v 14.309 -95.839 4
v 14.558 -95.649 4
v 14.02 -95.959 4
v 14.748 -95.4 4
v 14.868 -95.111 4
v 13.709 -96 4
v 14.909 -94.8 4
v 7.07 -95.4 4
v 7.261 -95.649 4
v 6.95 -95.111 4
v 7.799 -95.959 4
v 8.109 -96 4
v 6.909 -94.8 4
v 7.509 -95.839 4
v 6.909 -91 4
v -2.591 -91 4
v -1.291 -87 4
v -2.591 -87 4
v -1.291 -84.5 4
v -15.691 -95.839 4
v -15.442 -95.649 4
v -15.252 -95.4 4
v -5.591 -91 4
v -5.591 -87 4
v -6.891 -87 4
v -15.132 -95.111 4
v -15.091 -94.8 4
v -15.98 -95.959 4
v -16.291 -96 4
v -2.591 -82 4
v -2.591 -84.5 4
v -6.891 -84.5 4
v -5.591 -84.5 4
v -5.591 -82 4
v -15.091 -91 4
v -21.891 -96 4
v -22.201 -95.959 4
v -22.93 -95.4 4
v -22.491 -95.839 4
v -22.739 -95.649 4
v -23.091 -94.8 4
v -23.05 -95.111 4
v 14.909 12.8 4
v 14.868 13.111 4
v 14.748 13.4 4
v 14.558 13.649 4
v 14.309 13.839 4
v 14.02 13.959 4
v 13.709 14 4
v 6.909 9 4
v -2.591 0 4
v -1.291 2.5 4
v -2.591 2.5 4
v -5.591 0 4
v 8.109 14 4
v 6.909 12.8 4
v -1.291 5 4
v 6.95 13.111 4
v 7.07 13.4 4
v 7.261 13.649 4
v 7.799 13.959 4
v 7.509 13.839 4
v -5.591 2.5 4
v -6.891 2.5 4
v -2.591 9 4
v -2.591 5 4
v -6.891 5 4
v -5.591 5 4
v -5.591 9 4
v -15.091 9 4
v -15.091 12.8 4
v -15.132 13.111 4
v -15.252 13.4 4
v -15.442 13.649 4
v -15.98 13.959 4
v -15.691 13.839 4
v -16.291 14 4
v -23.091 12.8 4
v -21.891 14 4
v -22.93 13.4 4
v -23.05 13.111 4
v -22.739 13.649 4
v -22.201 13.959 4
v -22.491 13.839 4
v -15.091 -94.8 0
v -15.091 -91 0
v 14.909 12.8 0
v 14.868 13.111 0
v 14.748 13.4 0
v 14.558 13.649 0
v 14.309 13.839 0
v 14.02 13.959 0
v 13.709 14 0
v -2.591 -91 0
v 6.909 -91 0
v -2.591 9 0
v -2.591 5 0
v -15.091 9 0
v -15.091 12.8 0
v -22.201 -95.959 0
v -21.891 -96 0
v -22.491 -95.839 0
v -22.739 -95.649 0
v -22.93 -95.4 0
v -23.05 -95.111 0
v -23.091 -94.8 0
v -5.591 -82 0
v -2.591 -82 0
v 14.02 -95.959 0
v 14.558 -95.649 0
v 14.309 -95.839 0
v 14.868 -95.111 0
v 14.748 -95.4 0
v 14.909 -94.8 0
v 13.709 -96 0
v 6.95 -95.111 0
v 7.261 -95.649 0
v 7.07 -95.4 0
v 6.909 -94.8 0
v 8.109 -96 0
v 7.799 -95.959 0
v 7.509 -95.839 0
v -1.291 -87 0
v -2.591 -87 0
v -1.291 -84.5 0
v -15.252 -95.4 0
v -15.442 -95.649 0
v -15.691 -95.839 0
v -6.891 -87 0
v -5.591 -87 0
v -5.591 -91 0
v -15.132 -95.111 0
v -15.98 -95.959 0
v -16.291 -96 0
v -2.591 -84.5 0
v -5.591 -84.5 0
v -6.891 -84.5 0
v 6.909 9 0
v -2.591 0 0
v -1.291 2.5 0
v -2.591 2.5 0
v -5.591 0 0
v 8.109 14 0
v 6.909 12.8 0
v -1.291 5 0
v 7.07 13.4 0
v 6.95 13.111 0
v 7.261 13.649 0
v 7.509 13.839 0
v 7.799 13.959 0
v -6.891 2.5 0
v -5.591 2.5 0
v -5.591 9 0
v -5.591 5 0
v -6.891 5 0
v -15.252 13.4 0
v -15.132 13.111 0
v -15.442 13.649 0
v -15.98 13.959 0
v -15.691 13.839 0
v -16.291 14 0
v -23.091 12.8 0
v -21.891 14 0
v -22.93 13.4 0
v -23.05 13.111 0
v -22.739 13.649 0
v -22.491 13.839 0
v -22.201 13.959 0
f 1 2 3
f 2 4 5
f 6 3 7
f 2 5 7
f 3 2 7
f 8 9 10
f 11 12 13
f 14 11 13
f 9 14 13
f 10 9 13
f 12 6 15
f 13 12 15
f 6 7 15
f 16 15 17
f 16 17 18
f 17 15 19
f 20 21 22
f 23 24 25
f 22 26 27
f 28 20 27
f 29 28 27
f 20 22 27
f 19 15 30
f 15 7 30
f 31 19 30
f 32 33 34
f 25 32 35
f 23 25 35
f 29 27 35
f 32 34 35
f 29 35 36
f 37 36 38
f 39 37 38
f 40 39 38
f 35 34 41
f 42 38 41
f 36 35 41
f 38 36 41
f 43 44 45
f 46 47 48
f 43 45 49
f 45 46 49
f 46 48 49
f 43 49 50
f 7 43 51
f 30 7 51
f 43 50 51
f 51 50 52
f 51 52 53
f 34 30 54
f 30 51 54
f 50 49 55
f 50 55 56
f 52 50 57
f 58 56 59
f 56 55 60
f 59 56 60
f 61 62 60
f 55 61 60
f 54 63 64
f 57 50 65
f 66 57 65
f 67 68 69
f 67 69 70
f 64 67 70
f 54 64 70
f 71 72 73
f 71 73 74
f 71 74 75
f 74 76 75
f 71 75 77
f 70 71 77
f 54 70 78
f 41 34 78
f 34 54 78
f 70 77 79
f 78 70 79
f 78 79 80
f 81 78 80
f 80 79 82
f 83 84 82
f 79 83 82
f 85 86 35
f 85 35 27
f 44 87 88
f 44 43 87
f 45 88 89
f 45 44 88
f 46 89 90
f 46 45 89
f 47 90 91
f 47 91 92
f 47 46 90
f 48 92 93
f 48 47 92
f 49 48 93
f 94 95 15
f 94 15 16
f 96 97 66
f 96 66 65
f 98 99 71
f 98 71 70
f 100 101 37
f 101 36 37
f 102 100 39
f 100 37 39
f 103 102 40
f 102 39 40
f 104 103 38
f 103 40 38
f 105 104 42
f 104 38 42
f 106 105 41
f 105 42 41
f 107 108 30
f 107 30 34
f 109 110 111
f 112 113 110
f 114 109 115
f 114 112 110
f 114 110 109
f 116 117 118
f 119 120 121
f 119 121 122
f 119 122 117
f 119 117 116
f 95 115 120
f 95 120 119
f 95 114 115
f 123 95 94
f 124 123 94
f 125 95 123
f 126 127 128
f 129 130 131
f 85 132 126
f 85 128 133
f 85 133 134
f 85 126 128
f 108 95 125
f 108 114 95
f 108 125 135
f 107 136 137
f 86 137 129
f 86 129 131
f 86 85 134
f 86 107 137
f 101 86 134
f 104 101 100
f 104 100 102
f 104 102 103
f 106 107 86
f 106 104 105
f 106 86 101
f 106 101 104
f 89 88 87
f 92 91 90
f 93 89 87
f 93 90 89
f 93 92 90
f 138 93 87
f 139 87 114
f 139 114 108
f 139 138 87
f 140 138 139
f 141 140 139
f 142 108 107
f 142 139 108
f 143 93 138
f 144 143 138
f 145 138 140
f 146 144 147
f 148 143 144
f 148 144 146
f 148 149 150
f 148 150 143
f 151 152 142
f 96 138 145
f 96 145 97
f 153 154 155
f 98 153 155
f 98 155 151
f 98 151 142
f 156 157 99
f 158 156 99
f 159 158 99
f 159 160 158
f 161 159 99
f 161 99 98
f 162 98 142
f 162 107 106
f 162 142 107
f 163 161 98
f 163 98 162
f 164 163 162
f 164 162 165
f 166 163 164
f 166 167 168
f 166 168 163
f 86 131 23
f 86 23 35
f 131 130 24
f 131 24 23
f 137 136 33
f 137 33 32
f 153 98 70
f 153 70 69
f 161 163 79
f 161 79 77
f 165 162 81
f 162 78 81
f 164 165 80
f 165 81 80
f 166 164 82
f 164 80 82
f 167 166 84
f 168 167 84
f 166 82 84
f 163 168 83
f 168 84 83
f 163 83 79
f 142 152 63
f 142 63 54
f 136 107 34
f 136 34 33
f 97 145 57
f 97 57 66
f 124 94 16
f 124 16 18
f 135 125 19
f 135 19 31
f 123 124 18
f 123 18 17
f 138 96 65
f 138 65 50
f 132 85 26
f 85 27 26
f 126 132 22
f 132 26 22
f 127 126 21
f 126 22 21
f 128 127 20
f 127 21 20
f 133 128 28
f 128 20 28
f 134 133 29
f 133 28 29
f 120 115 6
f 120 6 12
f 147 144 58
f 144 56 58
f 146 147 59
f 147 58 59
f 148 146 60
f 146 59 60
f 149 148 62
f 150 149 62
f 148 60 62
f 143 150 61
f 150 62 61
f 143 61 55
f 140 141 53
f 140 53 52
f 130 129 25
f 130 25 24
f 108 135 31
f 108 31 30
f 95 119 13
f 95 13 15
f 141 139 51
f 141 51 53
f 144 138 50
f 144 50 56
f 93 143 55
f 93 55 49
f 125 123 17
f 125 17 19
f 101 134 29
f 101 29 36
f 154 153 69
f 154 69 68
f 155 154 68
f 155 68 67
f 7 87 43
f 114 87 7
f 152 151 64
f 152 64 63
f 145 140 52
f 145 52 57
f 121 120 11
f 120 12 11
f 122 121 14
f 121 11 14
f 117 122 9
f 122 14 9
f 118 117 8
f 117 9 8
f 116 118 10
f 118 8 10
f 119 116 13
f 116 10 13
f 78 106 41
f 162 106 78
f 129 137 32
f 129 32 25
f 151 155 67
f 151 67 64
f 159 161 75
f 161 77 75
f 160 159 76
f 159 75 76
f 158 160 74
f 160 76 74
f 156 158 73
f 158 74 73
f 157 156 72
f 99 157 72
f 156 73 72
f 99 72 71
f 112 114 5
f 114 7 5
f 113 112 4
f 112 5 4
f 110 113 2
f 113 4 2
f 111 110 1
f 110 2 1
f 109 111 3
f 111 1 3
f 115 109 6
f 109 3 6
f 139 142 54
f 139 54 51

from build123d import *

# Parameters (mm, degrees)
EXTRUDE_1_DEPTH = 4
FILLET_1_R      = 1.2


with BuildPart() as part:
    # 草图1 → 凸台-拉伸1 (new body)
    with BuildSketch(Plane.XY):
        Polygon((14.909090909, 14), (14.909090909, -96), (6.909090909, -96), (6.909090909, -91), (-2.590909091, -91), (-2.590909091, -87), (-1.290909091, -87), (-1.290909091, -84.5), (-2.590909091, -84.5), (-2.590909091, -82), (-5.590909091, -82), (-5.590909091, -84.5), (-6.890909091, -84.5), (-6.890909091, -87), (-5.590909091, -87), (-5.590909091, -91), (-15.090909091, -91), (-15.090909091, -96), (-23.090909091, -96), (-23.090909091, 14), (-15.090909091, 14), (-15.090909091, 9), (-5.590909091, 9), (-5.590909091, 5), (-6.890909091, 5), (-6.890909091, 2.5), (-5.590909091, 2.5), (-5.590909091, 0), (-2.590909091, 0), (-2.590909091, 2.5), (-1.290909091, 2.5), (-1.290909091, 5), (-2.590909091, 5), (-2.590909091, 9), (6.909090909, 9), (6.909090909, 14), align=None)
    extrude(amount=EXTRUDE_1_DEPTH)

    # 圆角1
    fillet_1_edges = [part.edges().sort_by_distance(p)[0] for p in [
        (6.909090909, 14, 2),
        (14.909090909, 14, 2),
        (14.909090909, -96, 2),
        (6.909090909, -96, 2),
        (-15.090909091, -96, 2),
        (-23.090909091, -96, 2),
        (-23.090909091, 14, 2),
        (-15.090909091, 14, 2),
    ]]
    fillet(fillet_1_edges, radius=FILLET_1_R)


solid = part.part
